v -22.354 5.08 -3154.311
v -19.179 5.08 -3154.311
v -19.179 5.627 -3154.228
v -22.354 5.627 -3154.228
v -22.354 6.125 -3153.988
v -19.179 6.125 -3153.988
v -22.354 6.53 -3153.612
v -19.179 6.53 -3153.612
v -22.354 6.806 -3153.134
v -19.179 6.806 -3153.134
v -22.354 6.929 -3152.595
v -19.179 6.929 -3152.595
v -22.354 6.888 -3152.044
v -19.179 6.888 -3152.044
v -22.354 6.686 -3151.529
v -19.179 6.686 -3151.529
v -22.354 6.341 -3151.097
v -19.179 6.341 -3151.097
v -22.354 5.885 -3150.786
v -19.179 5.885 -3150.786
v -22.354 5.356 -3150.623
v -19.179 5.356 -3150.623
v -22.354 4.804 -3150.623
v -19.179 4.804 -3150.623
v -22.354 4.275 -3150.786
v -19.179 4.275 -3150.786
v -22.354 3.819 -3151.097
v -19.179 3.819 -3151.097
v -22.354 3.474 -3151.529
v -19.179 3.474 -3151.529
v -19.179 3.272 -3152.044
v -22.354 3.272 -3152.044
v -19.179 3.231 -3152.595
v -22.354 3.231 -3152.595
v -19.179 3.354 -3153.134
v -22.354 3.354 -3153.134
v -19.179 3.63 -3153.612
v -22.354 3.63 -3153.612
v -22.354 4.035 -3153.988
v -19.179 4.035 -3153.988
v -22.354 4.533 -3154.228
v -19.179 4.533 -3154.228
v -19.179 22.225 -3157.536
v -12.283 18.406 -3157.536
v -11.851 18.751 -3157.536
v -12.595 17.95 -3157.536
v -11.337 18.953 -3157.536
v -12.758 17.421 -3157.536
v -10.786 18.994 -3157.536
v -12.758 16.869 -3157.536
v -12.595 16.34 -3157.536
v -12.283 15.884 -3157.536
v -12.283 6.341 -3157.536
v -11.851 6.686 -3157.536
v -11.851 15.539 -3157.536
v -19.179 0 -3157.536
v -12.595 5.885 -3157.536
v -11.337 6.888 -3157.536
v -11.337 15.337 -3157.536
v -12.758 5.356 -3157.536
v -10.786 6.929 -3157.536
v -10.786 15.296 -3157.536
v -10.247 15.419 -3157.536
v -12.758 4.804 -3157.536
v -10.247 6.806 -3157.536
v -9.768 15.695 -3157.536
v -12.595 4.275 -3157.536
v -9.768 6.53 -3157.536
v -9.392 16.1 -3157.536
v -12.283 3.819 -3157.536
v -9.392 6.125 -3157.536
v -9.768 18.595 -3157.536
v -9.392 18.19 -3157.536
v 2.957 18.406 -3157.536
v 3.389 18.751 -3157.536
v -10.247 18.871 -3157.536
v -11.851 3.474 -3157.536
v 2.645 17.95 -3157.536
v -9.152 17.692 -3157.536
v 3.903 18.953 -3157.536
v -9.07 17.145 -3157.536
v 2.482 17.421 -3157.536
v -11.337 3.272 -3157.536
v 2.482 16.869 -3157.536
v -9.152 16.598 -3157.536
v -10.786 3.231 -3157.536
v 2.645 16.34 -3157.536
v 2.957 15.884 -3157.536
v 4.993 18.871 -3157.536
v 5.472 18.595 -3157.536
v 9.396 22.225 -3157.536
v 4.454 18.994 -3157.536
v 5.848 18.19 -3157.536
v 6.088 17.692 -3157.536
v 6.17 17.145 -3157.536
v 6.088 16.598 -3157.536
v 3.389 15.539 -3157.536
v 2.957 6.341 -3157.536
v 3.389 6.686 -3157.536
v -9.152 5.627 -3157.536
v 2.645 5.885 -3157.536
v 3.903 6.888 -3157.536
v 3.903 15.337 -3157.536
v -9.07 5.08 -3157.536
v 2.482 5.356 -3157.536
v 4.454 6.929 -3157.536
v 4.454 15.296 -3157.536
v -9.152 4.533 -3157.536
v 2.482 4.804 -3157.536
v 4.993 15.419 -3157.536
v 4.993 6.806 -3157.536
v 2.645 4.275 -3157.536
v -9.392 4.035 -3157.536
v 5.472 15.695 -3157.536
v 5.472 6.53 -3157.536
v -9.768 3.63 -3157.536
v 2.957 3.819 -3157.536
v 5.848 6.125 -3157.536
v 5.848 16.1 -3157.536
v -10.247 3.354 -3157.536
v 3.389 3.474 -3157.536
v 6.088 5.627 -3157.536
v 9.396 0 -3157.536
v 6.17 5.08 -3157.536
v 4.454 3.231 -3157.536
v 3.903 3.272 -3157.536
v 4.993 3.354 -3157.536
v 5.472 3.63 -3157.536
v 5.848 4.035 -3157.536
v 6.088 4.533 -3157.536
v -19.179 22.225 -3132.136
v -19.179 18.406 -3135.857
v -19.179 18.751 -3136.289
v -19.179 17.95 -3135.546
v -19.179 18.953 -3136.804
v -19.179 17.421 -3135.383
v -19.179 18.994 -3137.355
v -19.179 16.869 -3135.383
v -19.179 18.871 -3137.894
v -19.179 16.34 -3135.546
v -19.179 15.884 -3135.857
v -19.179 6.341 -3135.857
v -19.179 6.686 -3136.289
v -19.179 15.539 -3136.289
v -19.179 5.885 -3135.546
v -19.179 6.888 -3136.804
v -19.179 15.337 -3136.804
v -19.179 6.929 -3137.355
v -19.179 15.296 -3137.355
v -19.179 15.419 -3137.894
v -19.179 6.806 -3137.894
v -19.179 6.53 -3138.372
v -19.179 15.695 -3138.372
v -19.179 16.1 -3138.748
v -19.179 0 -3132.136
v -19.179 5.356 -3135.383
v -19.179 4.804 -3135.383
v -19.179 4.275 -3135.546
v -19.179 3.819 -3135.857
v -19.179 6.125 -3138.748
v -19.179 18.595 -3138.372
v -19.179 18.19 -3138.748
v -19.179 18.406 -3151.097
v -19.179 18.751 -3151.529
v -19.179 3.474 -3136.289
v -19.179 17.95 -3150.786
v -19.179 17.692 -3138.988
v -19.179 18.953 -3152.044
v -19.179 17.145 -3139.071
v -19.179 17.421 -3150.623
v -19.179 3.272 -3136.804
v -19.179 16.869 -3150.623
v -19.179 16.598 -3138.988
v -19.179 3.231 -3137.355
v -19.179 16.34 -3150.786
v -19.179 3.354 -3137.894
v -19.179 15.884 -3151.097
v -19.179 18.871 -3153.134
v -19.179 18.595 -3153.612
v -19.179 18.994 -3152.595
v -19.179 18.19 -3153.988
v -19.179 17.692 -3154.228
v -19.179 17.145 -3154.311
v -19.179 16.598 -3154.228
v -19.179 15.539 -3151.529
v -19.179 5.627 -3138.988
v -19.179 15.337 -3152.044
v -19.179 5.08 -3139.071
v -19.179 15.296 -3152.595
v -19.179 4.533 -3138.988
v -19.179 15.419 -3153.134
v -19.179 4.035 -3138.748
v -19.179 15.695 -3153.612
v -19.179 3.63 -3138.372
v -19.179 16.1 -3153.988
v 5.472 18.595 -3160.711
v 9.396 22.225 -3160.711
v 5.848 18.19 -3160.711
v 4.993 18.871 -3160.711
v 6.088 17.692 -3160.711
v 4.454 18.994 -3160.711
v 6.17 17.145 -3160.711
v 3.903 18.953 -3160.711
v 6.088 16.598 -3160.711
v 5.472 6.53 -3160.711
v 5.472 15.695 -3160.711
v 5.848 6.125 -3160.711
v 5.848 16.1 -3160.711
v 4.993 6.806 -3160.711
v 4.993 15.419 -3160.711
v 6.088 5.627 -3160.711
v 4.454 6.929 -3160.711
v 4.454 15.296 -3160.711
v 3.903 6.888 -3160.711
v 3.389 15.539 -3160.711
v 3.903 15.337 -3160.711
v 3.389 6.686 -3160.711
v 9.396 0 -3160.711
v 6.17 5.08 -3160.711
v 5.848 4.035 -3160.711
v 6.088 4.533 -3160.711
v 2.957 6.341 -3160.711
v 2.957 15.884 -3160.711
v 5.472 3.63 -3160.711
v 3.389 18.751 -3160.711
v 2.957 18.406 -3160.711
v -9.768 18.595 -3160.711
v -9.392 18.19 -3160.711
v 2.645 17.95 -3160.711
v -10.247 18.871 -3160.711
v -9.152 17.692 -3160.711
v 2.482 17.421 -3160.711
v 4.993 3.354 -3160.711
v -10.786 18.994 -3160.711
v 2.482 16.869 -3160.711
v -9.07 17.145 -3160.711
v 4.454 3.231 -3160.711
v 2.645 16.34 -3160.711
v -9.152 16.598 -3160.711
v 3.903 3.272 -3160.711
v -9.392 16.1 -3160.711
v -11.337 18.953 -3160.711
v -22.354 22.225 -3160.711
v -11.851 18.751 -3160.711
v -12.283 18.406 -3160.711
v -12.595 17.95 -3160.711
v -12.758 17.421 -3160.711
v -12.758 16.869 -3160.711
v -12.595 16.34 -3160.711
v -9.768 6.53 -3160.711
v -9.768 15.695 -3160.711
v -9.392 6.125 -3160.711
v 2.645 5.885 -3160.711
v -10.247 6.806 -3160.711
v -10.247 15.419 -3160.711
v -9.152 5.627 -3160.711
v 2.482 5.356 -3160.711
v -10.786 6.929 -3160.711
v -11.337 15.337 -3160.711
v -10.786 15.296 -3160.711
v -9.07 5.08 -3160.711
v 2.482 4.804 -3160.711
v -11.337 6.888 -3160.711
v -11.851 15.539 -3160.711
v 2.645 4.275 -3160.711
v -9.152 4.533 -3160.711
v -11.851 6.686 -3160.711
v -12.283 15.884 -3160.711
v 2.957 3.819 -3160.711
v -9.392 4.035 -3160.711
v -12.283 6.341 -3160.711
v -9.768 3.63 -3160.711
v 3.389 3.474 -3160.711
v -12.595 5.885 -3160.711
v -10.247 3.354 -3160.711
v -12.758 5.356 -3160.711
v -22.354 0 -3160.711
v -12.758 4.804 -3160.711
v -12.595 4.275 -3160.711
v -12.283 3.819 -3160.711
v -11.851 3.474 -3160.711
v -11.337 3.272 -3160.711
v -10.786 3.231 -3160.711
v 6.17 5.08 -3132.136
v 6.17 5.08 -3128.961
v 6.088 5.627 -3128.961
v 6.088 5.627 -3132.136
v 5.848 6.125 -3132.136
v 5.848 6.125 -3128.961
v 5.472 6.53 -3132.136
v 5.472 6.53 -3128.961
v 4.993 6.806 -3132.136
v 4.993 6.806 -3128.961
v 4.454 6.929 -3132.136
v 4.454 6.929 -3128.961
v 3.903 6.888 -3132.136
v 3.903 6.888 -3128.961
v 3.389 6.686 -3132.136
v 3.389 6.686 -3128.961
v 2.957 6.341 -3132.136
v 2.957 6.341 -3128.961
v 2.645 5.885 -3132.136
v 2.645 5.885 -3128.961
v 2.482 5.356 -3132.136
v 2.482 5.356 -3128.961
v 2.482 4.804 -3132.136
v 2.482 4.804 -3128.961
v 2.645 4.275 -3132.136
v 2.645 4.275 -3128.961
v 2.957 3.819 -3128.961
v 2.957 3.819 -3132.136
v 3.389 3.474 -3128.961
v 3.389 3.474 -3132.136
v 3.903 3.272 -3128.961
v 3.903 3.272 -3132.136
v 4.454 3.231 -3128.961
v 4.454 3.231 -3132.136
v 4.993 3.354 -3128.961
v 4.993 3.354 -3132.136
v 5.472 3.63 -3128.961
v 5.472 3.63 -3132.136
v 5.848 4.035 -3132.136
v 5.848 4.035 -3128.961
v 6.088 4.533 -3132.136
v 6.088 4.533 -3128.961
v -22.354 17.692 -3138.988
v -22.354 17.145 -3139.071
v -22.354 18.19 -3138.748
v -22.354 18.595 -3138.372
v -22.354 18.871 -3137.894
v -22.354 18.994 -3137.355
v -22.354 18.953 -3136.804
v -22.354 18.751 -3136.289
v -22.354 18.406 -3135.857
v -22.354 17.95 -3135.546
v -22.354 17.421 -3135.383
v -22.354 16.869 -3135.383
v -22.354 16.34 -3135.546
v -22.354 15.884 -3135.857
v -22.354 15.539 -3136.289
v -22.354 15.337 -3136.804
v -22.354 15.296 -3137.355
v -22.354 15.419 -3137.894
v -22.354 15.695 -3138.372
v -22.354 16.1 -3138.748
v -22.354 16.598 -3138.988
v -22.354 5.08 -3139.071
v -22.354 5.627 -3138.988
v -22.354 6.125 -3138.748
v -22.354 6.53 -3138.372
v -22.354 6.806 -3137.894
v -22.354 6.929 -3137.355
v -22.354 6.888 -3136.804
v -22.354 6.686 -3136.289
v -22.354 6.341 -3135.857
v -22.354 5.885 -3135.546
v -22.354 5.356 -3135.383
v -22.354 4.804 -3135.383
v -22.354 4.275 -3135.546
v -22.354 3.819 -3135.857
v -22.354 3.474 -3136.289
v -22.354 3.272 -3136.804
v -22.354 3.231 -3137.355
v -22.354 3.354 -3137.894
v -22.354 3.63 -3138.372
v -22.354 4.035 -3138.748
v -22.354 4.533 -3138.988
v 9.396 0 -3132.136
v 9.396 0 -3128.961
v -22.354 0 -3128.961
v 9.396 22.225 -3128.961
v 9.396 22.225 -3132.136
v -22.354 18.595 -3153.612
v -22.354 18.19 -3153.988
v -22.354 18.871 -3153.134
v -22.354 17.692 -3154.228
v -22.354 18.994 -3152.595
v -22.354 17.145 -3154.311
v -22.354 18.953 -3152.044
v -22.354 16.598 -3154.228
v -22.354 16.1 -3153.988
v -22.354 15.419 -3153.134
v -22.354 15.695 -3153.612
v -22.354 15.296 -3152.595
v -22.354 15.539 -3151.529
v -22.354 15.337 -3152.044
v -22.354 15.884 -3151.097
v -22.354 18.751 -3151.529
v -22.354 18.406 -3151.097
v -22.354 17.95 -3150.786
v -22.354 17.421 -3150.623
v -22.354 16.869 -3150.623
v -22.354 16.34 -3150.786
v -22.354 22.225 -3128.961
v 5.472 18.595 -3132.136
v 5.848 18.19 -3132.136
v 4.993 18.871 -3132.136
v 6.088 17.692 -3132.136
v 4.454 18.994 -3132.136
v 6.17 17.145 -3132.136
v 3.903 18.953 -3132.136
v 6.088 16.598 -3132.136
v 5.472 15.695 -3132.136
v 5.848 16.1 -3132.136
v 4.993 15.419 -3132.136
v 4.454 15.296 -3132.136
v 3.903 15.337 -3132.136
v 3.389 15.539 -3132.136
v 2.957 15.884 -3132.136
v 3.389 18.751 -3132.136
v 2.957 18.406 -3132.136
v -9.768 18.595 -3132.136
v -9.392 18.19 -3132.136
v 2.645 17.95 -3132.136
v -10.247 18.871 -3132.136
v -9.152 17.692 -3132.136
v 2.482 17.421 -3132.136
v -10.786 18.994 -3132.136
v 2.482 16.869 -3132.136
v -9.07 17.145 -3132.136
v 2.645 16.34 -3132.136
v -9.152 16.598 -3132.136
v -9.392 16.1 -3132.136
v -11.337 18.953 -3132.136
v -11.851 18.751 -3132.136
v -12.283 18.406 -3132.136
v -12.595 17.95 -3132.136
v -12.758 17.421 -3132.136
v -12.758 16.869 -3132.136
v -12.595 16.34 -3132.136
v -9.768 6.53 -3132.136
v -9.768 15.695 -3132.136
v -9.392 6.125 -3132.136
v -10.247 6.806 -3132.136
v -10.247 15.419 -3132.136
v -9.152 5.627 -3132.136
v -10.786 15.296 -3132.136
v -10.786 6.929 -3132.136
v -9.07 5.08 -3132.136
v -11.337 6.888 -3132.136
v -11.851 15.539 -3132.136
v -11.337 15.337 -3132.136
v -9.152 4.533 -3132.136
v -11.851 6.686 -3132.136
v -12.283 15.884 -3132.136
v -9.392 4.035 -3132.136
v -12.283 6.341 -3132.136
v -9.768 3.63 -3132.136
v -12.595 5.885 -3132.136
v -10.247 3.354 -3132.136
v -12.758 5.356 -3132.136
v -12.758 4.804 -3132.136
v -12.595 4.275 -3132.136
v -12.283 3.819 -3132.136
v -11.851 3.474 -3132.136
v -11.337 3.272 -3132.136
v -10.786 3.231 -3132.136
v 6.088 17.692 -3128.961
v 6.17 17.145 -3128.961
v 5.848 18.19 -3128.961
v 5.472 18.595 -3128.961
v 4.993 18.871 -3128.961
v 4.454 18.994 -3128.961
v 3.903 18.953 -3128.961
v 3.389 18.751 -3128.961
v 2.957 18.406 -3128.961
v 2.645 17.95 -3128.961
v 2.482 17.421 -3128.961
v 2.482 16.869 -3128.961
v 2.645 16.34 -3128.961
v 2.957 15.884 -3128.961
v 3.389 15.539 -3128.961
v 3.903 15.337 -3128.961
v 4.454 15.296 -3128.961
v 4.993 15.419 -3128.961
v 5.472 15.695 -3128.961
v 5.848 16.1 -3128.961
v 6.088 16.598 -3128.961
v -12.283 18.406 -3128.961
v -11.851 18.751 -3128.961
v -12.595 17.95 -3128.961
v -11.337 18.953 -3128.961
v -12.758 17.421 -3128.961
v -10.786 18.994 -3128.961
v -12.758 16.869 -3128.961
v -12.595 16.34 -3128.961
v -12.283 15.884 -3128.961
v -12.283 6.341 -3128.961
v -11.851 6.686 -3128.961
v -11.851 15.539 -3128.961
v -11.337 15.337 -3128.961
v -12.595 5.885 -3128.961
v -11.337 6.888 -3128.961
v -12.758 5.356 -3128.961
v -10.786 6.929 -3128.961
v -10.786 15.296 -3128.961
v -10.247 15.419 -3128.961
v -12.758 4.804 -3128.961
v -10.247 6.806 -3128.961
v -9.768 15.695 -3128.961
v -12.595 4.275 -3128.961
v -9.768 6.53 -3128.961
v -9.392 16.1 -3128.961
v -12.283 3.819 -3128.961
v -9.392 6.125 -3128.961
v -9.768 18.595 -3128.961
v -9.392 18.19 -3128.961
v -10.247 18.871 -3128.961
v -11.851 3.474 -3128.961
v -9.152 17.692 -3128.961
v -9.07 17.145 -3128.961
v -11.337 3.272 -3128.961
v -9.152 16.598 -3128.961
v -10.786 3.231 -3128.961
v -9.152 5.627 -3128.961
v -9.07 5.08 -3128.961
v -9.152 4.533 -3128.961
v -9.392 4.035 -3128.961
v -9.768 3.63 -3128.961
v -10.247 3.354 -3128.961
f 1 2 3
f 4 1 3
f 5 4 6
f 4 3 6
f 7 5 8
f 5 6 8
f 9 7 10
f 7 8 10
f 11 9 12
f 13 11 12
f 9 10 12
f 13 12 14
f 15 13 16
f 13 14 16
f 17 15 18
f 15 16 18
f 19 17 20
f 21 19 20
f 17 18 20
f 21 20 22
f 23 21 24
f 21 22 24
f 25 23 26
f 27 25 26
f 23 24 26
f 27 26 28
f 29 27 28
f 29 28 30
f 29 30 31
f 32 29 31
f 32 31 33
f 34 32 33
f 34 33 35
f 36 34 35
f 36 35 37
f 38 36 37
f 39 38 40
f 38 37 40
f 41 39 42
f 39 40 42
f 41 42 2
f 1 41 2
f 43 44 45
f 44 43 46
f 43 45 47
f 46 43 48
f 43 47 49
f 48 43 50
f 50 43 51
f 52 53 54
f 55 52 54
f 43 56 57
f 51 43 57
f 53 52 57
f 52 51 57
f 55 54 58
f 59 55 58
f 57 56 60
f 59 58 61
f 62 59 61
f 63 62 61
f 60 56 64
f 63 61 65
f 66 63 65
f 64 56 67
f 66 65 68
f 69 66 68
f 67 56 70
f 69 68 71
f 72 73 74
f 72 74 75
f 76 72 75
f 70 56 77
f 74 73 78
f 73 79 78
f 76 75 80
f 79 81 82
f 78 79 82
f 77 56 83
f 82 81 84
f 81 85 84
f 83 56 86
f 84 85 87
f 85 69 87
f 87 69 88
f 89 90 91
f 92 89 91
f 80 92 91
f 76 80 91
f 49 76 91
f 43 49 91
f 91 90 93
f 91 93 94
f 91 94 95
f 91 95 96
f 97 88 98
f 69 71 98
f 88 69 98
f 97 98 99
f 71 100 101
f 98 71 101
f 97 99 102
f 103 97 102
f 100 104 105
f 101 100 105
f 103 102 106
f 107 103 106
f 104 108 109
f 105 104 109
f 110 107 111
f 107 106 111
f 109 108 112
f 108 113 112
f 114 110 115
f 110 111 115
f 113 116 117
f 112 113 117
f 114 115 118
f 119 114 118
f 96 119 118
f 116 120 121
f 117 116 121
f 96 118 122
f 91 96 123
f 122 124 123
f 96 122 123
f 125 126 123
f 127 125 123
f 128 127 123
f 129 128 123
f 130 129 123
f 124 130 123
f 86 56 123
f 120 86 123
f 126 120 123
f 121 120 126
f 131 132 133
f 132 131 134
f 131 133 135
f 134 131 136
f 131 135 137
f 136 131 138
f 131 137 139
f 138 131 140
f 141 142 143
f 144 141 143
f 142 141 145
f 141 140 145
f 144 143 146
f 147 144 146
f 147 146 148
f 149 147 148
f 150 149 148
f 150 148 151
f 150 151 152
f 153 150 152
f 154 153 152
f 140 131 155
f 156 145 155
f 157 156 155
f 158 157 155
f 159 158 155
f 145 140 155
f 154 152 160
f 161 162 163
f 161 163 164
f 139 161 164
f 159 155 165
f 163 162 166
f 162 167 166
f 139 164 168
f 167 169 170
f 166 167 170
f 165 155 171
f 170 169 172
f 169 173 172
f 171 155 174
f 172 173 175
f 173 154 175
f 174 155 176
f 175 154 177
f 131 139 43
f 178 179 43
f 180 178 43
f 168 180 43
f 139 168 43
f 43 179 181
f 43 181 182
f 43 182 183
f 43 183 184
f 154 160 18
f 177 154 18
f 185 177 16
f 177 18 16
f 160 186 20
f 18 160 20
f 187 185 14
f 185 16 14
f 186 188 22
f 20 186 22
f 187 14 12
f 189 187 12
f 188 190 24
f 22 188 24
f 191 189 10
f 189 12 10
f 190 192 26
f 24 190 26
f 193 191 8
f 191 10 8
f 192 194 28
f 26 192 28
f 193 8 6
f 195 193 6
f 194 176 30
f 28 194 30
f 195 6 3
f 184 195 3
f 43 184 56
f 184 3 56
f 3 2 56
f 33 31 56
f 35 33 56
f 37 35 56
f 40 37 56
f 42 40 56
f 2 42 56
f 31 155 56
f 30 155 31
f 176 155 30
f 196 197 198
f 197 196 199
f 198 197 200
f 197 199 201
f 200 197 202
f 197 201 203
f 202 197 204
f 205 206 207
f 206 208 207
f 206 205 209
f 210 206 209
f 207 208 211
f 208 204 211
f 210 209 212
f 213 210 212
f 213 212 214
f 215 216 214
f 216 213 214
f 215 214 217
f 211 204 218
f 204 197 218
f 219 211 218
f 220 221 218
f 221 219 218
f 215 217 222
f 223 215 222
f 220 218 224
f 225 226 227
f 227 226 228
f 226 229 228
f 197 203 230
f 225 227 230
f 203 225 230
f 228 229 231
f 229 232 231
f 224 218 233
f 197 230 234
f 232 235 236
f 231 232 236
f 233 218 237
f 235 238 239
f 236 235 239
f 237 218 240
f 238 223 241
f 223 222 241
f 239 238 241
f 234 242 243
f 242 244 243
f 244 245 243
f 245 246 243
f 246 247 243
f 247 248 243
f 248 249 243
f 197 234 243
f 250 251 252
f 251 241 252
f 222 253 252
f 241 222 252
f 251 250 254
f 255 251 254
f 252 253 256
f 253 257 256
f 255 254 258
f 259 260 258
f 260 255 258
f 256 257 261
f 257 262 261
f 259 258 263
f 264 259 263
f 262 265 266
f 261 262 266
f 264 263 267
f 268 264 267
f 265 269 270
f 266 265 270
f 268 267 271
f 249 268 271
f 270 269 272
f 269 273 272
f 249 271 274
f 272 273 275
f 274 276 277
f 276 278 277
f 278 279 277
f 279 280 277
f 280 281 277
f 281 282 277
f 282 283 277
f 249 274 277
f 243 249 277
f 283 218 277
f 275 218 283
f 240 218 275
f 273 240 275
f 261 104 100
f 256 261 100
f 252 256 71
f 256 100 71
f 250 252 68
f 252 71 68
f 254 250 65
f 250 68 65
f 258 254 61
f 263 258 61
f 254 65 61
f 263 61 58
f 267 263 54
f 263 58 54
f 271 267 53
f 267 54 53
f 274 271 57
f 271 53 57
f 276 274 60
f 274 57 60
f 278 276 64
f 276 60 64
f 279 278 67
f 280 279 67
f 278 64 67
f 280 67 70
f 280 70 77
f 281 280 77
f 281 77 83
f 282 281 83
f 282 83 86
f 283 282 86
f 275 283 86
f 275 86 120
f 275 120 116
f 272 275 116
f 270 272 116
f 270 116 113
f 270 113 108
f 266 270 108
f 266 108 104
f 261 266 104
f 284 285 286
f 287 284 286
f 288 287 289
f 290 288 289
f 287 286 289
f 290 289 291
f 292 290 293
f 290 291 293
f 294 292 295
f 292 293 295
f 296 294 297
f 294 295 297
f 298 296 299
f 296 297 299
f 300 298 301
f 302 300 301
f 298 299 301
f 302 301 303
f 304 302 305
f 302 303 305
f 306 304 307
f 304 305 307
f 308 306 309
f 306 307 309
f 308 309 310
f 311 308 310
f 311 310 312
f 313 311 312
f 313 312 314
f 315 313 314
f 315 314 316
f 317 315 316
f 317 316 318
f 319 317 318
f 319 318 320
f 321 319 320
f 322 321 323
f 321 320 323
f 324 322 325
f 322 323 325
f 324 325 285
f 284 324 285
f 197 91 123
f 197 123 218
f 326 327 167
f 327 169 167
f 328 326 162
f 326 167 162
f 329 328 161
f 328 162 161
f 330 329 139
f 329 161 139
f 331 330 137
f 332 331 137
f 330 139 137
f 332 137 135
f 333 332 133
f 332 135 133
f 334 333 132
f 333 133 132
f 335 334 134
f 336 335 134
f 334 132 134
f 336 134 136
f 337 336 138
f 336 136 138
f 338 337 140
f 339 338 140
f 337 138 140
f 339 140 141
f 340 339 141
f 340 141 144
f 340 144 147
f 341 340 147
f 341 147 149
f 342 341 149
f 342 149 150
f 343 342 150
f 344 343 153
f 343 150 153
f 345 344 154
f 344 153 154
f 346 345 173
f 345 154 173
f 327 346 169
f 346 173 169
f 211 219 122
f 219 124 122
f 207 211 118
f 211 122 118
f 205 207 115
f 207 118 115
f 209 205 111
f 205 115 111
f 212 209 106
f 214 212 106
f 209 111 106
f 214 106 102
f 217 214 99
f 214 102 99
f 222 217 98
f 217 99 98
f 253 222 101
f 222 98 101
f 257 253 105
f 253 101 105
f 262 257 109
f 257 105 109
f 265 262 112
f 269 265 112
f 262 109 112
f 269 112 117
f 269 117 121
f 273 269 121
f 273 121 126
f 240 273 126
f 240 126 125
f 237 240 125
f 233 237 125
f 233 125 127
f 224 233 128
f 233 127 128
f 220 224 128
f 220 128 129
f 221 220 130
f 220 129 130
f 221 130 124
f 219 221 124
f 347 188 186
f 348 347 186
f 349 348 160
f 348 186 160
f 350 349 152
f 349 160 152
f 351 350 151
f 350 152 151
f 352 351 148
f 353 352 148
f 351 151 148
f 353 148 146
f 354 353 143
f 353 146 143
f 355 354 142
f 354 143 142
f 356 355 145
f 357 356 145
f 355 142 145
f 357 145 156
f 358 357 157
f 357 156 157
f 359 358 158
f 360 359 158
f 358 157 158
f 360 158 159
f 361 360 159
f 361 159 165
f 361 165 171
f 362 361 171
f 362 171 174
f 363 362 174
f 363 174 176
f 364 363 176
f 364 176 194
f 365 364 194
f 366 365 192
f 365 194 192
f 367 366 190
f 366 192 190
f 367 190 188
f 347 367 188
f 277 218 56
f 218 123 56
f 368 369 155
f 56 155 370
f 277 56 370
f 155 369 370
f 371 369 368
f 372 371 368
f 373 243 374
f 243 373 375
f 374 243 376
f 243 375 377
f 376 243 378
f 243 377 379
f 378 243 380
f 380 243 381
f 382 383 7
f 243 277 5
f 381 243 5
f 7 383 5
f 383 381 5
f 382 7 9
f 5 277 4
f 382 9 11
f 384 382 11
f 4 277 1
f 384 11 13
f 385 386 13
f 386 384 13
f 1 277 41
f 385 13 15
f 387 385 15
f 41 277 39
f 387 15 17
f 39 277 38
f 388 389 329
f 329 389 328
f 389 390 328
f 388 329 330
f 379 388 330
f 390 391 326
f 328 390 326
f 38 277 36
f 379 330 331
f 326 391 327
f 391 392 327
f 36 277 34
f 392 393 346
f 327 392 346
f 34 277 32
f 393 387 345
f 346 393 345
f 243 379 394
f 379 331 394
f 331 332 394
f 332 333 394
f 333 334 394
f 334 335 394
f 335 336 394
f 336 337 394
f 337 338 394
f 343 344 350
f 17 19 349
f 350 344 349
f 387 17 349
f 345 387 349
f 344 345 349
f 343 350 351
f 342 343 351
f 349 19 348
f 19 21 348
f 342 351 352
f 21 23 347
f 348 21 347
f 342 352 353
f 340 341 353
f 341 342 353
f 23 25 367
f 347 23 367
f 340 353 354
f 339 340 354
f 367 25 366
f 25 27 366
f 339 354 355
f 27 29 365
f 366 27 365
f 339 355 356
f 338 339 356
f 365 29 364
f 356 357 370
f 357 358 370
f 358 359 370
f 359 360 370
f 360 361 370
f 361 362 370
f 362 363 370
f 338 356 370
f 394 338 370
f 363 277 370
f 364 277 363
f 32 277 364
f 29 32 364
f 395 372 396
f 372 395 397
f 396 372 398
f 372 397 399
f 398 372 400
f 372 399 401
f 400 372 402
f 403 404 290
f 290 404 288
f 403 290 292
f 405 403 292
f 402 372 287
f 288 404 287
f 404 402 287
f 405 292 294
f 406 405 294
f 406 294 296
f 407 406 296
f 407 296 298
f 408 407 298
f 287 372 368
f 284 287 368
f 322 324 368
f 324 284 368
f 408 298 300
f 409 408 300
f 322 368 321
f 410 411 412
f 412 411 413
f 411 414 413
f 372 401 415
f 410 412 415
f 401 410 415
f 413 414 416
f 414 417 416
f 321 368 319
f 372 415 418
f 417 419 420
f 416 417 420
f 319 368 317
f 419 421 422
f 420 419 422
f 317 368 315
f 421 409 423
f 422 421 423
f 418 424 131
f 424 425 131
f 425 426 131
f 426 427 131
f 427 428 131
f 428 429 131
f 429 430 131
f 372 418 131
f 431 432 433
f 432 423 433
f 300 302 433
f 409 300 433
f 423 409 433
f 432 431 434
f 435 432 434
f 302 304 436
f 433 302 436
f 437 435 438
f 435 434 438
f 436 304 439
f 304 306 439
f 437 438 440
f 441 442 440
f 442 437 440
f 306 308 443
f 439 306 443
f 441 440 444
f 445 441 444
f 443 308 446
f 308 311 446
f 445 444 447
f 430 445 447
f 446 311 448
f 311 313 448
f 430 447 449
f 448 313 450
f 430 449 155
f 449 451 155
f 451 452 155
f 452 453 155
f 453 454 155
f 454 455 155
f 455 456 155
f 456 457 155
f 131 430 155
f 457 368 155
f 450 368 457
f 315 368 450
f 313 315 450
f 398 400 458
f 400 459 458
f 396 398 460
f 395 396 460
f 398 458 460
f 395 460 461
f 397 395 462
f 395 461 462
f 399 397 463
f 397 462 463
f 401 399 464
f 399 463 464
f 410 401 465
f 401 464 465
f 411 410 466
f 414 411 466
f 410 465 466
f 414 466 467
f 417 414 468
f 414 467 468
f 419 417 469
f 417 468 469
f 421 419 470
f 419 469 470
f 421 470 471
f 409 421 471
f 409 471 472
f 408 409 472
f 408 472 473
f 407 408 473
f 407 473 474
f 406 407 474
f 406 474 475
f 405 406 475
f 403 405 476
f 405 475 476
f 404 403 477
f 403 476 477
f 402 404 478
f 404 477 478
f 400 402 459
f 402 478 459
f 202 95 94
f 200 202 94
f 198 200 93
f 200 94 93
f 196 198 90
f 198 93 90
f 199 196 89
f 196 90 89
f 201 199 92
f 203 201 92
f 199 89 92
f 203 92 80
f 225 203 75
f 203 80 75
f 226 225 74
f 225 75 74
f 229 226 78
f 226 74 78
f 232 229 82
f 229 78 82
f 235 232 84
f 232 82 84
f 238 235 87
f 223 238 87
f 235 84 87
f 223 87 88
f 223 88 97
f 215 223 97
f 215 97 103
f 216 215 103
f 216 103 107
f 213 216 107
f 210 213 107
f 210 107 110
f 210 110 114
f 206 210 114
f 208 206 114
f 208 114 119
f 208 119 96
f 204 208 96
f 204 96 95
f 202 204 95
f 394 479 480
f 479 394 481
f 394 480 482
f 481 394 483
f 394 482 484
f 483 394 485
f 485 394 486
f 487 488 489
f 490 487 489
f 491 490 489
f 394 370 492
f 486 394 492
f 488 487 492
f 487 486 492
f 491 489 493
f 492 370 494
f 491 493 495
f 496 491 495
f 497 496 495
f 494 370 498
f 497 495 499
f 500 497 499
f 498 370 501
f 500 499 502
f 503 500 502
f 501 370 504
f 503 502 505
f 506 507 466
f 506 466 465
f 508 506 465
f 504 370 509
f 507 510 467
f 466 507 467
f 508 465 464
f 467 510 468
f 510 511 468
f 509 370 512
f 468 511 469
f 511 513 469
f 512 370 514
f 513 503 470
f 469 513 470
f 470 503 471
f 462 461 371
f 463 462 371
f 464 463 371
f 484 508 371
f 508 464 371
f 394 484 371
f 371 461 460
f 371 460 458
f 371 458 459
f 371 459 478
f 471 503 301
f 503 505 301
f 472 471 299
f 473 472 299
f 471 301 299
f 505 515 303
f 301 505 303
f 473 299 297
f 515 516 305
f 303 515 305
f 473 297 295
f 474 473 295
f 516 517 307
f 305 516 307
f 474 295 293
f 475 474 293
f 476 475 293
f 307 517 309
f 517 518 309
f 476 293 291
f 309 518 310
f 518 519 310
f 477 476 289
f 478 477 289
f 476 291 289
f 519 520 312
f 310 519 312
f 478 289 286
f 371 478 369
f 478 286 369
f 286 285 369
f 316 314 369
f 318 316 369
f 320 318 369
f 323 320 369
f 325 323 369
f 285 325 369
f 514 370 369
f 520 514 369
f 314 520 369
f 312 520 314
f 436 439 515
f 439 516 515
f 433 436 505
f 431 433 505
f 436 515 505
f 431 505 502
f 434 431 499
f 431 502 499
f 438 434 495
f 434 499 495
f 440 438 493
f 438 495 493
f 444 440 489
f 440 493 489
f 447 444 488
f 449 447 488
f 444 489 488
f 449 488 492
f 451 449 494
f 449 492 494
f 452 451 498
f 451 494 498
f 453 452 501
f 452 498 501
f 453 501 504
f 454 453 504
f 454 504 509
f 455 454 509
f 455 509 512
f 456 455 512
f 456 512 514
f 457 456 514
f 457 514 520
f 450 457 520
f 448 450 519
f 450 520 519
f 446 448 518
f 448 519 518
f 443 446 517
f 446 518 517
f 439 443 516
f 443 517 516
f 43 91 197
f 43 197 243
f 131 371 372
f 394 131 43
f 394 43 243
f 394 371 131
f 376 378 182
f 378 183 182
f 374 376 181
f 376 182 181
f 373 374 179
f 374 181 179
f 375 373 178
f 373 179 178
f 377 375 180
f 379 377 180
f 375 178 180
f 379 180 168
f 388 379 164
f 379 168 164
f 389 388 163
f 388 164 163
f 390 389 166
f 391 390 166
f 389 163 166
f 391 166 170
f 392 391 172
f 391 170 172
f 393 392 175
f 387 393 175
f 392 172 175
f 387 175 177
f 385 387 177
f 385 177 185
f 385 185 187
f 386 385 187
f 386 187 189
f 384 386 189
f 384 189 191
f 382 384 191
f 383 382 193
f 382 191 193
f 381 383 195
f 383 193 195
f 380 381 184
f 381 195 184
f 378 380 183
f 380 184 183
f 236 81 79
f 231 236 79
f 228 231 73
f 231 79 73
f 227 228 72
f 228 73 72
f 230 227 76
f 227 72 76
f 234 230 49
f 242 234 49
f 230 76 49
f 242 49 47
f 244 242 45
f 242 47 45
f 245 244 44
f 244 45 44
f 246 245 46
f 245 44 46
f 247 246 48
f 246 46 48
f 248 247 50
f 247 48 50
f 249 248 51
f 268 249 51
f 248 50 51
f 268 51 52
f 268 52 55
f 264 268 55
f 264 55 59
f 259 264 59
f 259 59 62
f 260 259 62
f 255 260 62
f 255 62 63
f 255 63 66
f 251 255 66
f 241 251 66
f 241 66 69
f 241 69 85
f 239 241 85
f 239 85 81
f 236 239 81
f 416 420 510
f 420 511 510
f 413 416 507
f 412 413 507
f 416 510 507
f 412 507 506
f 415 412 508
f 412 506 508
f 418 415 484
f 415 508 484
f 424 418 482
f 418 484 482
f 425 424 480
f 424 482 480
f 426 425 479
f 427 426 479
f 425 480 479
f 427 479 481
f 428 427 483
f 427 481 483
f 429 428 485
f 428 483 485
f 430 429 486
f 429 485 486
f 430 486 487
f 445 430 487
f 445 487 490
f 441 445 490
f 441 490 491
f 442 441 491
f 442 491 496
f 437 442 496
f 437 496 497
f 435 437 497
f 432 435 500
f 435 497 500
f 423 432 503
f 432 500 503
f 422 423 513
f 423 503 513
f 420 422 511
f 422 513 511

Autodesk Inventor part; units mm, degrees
ref_plane "YZ Plane" through (0, 0, 0) normal (1, 0, 0) x (0, 1, 0)
ref_plane "XZ Plane" through (0, 0, 0) normal (0, 1, 0) x (-1, 0, 0)
ref_plane "XY Plane" through (0, 0, 0) normal (0, 0, 1) x (1, 0, 0)
sketch "Sketch1" plane through (0, 0, 0) normal (0, 1, 0) x (-1, 0, 0)
  line L0 (22.3541, -3128.9614) -> (-9.3959, -3128.9614)
  line L1 (-9.3959, -3128.9614) -> (-9.3959, -3132.1364)
  line L2 (-9.3959, -3132.1364) -> (22.3541, -3132.1364)
  line L3 (22.3541, -3132.1364) -> (22.3541, -3128.9614)
  line L4 (22.3541, -3128.9614) -> (19.1791, -3128.9614)
  line L5 (19.1791, -3128.9614) -> (19.1791, -3157.5364)
  line L6 (19.1791, -3157.5364) -> (22.3541, -3157.5364)
  line L7 (22.3541, -3157.5364) -> (22.3541, -3128.9614)
  line L8 (22.3541, -3157.5364) -> (-9.3959, -3157.5364)
  line L9 (-9.3959, -3157.5364) -> (-9.3959, -3160.7114)
  line L10 (-9.3959, -3160.7114) -> (22.3541, -3160.7114)
  line L11 (22.3541, -3160.7114) -> (22.3541, -3157.5364)
  point P0 (0, 0)
  point P1 (19.1791, -3132.1364)
  dimension "d0" = 31.75
  dimension "d1" = 3.175
  dimension "d2" = 3.175
  dimension "d4" = 31.75
  dimension "d5" = 3.175
  dimension "d22" = 31.75
extrude "Extrusion1" add sketch "Sketch1" along normal blind 22.225
sketch "Sketch2" plane through (-19.1791, 0, -3132.1364) normal (1, 0, 0) x (0, 0, -1)
  line L0 (-3.175, 0) -> (0, 0) projected
  line L1 (0, 0) -> (0, 22.225) projected
  line L2 (-3.175, 22.225) -> (0, 22.225) projected
  line L3 (-3.175, 0) -> (-3.175, 22.225) projected
  line L4 (25.4, 0) -> (28.575, 0) projected
  line L5 (28.575, 0) -> (28.575, 22.225) projected
  line L6 (25.4, 22.225) -> (28.575, 22.225) projected
  line L7 (25.4, 0) -> (25.4, 22.225) projected
  circle A0 centre (5.08, 17.145) radius 1.8542
  circle A1 centre (20.32, 17.145) radius 1.8542
  circle A2 centre (5.08, 5.08) radius 1.8542
  circle A3 centre (20.32, 5.08) radius 1.8542
  line L8 (0, 22.225) -> (25.4, 22.225) projected
  line L9 (0, 0) -> (25.4, 0) projected
  point P0 (-3132.1364, 0)
  dimension "d8" = 3.7084
  dimension "d9" = 3.7084
  dimension "d10" = 3.7084
  dimension "d11" = 3.7084
  dimension "d12" = 5.08
  dimension "d13" = 5.08
  dimension "d14" = 5.08
  dimension "d15" = 5.08
  dimension "d16" = 5.08
  dimension "d17" = 5.08
  dimension "d18" = 5.08
  dimension "d19" = 5.08
extrude "Extrusion2" cut sketch "Sketch2" against normal blind 25.4 contours A0 | A1 | A2 | A3
sketch "Sketch3" plane through (-22.3541, 0, -3128.9614) normal (0, 0, 1) x (1, 0, 0)
  circle A0 centre (26.67, 17.145) radius 1.8542
  circle A1 centre (11.43, 17.145) radius 1.8542
  circle A2 centre (26.67, 5.08) radius 1.8542
  circle A3 centre (11.43, 5.08) radius 1.8542
  line L0 (0, 0) -> (31.75, 0) projected
  line L1 (31.75, 0) -> (31.75, 22.225) projected
  line L2 (0, 22.225) -> (31.75, 22.225) projected
  line L3 (0, 0) -> (0, 22.225) projected
  point P0 (22.3541, 0)
  dimension "d23" = 3.7084
  dimension "d24" = 3.7084
  dimension "d25" = 3.7084
  dimension "d26" = 3.7084
  dimension "d27" = 5.08
  dimension "d28" = 5.08
  dimension "d29" = 11.43
  dimension "d30" = 11.43
  dimension "d31" = 5.08
  dimension "d32" = 5.08
  dimension "d33" = 5.08
  dimension "d34" = 5.08
extrude "Extrusion3" cut sketch "Sketch3" against normal blind 50.8 contours A0 | A1 | A2 | A3
equation "\"d4\" = d0"
equation "\"d13\" = d12"
equation "\"d14\" = d12"
equation "\"d15\" = d12"
equation "\"d17\" = d16"
equation "\"d18\" = d16"
equation "\"d19\" = d16"
equation "\"d28\" = d27"
equation "\"d30\" = d29"
equation "\"d32\" = d31"
equation "\"d33\" = d31"
equation "\"d34\" = d31"
properties part number "connector"
